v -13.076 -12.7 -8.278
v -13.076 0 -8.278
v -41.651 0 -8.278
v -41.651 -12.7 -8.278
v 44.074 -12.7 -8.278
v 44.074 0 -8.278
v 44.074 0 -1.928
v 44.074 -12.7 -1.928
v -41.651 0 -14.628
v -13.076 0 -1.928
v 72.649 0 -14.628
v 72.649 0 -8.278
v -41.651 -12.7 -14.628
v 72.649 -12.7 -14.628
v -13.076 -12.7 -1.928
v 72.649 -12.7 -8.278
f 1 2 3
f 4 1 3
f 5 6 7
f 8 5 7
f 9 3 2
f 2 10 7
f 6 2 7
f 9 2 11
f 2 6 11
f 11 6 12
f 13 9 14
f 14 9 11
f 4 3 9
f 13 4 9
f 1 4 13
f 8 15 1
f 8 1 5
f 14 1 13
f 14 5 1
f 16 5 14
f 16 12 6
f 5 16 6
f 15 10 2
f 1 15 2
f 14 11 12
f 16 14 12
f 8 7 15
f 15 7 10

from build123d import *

# Parameters (mm, degrees)
F1_DEPTH = 12.7


with BuildPart() as f1:
    # F0 (on Front) → F1 (new body)
    with BuildSketch(Plane.XZ):
        Polygon((44.074243, -1.927952), (-13.075757, -1.927952), (-13.075757, -8.277952), (15.499243, -8.277952), (44.074243, -8.277952), align=None)
        Polygon((15.499243, -8.277952), (-13.075757, -8.277952), (-41.650757, -8.277952), (-41.650757, -14.627952), (15.499243, -14.627952), align=None)
        Polygon((72.649243, -8.277952), (44.074243, -8.277952), (15.499243, -8.277952), (15.499243, -14.627952), (72.649243, -14.627952), align=None)
    extrude(amount=F1_DEPTH)


solid = f1.part
